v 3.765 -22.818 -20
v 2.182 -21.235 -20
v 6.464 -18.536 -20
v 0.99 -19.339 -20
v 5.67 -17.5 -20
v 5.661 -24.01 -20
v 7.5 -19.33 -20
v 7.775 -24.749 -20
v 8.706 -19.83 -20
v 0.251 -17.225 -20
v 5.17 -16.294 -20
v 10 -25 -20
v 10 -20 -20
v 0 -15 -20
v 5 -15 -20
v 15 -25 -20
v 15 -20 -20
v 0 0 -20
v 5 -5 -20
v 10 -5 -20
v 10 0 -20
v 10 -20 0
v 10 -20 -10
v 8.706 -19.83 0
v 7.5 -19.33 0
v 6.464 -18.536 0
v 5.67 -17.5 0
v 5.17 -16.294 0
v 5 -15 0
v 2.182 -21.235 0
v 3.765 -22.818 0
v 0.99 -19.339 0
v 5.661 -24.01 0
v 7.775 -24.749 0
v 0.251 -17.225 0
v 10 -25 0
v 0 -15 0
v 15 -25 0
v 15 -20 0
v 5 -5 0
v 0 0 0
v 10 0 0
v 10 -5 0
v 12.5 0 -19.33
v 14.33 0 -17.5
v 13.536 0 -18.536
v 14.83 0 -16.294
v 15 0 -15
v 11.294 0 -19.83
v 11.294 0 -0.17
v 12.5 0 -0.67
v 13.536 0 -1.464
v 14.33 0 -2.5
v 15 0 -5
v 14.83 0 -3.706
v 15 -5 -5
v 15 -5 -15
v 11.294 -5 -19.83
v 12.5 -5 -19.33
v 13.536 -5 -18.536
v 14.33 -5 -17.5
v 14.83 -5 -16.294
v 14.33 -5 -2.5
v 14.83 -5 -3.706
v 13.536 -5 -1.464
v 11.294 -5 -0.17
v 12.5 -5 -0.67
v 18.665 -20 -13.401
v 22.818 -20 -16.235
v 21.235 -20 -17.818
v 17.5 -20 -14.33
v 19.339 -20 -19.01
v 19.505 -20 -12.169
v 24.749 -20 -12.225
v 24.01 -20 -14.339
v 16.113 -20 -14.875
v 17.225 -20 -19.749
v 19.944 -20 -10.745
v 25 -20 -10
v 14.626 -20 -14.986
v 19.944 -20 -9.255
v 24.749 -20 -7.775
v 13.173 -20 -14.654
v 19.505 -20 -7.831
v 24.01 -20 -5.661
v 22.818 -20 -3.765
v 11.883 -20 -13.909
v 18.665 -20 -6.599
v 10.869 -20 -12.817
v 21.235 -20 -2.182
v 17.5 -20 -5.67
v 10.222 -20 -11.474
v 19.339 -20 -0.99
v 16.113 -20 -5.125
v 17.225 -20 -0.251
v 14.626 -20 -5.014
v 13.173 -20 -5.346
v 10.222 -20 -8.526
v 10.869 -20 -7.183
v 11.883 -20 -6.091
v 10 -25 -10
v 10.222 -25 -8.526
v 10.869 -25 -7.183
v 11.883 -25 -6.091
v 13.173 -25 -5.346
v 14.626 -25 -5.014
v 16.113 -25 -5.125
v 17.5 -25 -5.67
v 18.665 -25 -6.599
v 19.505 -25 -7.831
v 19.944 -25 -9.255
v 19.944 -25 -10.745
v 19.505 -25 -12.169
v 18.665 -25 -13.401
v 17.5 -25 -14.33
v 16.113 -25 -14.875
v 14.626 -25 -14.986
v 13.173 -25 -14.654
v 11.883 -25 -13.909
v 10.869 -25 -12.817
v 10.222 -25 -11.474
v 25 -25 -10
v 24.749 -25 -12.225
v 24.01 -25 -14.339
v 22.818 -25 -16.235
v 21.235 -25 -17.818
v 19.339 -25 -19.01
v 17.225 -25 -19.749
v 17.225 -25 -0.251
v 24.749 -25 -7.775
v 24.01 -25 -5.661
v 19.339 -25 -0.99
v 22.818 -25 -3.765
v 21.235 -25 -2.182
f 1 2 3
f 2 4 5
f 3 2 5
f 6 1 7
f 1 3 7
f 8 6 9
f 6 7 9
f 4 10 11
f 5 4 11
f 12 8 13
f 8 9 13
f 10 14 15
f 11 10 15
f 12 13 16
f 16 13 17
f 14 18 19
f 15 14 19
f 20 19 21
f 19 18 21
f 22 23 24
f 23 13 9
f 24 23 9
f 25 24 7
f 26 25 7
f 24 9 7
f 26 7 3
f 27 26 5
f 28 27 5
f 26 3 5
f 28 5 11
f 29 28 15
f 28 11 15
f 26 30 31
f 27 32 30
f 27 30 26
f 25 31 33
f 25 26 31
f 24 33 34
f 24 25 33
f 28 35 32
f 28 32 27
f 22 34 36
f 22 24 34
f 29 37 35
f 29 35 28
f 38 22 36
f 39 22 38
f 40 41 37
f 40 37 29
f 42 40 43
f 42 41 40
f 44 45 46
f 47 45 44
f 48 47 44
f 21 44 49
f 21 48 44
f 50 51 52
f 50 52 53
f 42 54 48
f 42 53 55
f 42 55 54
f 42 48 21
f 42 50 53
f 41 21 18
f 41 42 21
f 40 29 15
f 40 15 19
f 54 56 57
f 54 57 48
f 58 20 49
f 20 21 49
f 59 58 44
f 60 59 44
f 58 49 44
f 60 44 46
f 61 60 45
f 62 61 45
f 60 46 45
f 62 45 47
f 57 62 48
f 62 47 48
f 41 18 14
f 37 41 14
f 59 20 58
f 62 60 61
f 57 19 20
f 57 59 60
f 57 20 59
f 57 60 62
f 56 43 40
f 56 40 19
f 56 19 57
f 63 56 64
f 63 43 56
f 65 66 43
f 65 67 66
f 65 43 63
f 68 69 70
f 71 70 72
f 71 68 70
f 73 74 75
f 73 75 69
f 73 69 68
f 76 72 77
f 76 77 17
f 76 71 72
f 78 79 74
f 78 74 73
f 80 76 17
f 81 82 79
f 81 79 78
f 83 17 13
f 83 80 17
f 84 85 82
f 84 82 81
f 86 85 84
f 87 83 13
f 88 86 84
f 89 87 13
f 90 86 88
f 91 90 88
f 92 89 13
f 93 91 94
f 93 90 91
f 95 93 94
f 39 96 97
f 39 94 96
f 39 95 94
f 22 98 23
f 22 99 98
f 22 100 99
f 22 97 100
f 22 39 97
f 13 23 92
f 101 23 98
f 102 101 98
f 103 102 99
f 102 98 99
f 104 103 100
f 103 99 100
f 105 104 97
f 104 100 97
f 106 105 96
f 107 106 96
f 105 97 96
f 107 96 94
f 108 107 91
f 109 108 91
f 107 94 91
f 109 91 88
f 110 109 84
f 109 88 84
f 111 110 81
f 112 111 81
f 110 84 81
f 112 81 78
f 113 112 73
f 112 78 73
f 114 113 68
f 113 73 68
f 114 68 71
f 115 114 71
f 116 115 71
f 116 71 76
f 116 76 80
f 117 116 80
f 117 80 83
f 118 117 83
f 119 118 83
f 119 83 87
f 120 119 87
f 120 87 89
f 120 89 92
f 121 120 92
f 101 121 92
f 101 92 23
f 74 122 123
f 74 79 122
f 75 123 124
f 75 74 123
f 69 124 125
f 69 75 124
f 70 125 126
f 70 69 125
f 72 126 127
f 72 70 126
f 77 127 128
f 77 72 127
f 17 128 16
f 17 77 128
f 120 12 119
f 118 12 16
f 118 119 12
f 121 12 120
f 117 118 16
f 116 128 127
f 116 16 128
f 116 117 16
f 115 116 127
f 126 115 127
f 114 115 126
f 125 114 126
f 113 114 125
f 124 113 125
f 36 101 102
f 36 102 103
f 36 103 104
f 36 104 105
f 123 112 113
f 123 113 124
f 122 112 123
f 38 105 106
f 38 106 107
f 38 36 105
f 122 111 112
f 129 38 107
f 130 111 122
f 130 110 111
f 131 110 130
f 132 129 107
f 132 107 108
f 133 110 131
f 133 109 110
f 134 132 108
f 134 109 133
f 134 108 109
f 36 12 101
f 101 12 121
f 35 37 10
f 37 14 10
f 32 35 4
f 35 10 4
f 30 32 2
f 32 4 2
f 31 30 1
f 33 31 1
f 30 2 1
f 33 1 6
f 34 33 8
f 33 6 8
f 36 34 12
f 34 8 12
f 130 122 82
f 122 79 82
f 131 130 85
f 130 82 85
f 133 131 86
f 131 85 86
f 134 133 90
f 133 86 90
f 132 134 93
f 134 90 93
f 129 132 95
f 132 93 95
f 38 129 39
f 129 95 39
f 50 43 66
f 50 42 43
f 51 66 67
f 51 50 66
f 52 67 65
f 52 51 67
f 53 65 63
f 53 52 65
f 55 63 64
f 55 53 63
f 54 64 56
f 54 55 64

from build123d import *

# Parameters (mm, degrees)
SKETCH_2_W          = 5
SKETCH_2_H          = 5
SKETCH_2_W_2        = 10
SKETCH_2_H_2        = 15
EXTRUDE_1_DEPTH     = 20
FILLET_1_R          = 10
FILLET_2_R          = 5
SKETCH_3_R          = 5
CUT_EXTRUDE_1_DEPTH = 38.749172176


with BuildPart() as part:
    # 草圖2 → 填料-伸長1 (new body)
    with BuildSketch(Plane.XY):
        with Locations((2.5, -2.5)):
            Rectangle(SKETCH_2_W, SKETCH_2_H)
        with Locations((10, -2.5)):
            Rectangle(SKETCH_2_W_2, SKETCH_2_H)
        with Locations((2.5, -12.5)):
            Rectangle(SKETCH_2_W, SKETCH_2_H_2)
        Polygon((5, -20), (0, -20), (0, -25), (25, -25), (25, -20), align=None)
    extrude(amount=-EXTRUDE_1_DEPTH)

    # 圓角1
    fillet_1_edges = [part.edges().sort_by_distance(p)[0] for p in [
        (25, -22.5, 0),
        (25, -22.5, -20),
        (0, -25, -10),
    ]]
    fillet(fillet_1_edges, radius=FILLET_1_R - 0.0001)  # a hair under: the kernel refuses the full size

    # 圓角2
    fillet_2_edges = [part.edges().sort_by_distance(p)[0] for p in [
        (15, -2.5, -20),
        (15, -2.5, 0),
        (5, -20, -10),
    ]]
    fillet(fillet_2_edges, radius=FILLET_2_R)

    # 草圖3 → 除料-伸長1 (cut, through all)
    with BuildSketch(Plane(origin=(0, -20, 0), x_dir=(1, 0, 0), z_dir=(0, 1, 0))):
        with Locations(Location((15, 10, 0), (0, 0, 180))):
            Circle(SKETCH_3_R)
    extrude(amount=-CUT_EXTRUDE_1_DEPTH, mode=Mode.SUBTRACT)


solid = part.part
